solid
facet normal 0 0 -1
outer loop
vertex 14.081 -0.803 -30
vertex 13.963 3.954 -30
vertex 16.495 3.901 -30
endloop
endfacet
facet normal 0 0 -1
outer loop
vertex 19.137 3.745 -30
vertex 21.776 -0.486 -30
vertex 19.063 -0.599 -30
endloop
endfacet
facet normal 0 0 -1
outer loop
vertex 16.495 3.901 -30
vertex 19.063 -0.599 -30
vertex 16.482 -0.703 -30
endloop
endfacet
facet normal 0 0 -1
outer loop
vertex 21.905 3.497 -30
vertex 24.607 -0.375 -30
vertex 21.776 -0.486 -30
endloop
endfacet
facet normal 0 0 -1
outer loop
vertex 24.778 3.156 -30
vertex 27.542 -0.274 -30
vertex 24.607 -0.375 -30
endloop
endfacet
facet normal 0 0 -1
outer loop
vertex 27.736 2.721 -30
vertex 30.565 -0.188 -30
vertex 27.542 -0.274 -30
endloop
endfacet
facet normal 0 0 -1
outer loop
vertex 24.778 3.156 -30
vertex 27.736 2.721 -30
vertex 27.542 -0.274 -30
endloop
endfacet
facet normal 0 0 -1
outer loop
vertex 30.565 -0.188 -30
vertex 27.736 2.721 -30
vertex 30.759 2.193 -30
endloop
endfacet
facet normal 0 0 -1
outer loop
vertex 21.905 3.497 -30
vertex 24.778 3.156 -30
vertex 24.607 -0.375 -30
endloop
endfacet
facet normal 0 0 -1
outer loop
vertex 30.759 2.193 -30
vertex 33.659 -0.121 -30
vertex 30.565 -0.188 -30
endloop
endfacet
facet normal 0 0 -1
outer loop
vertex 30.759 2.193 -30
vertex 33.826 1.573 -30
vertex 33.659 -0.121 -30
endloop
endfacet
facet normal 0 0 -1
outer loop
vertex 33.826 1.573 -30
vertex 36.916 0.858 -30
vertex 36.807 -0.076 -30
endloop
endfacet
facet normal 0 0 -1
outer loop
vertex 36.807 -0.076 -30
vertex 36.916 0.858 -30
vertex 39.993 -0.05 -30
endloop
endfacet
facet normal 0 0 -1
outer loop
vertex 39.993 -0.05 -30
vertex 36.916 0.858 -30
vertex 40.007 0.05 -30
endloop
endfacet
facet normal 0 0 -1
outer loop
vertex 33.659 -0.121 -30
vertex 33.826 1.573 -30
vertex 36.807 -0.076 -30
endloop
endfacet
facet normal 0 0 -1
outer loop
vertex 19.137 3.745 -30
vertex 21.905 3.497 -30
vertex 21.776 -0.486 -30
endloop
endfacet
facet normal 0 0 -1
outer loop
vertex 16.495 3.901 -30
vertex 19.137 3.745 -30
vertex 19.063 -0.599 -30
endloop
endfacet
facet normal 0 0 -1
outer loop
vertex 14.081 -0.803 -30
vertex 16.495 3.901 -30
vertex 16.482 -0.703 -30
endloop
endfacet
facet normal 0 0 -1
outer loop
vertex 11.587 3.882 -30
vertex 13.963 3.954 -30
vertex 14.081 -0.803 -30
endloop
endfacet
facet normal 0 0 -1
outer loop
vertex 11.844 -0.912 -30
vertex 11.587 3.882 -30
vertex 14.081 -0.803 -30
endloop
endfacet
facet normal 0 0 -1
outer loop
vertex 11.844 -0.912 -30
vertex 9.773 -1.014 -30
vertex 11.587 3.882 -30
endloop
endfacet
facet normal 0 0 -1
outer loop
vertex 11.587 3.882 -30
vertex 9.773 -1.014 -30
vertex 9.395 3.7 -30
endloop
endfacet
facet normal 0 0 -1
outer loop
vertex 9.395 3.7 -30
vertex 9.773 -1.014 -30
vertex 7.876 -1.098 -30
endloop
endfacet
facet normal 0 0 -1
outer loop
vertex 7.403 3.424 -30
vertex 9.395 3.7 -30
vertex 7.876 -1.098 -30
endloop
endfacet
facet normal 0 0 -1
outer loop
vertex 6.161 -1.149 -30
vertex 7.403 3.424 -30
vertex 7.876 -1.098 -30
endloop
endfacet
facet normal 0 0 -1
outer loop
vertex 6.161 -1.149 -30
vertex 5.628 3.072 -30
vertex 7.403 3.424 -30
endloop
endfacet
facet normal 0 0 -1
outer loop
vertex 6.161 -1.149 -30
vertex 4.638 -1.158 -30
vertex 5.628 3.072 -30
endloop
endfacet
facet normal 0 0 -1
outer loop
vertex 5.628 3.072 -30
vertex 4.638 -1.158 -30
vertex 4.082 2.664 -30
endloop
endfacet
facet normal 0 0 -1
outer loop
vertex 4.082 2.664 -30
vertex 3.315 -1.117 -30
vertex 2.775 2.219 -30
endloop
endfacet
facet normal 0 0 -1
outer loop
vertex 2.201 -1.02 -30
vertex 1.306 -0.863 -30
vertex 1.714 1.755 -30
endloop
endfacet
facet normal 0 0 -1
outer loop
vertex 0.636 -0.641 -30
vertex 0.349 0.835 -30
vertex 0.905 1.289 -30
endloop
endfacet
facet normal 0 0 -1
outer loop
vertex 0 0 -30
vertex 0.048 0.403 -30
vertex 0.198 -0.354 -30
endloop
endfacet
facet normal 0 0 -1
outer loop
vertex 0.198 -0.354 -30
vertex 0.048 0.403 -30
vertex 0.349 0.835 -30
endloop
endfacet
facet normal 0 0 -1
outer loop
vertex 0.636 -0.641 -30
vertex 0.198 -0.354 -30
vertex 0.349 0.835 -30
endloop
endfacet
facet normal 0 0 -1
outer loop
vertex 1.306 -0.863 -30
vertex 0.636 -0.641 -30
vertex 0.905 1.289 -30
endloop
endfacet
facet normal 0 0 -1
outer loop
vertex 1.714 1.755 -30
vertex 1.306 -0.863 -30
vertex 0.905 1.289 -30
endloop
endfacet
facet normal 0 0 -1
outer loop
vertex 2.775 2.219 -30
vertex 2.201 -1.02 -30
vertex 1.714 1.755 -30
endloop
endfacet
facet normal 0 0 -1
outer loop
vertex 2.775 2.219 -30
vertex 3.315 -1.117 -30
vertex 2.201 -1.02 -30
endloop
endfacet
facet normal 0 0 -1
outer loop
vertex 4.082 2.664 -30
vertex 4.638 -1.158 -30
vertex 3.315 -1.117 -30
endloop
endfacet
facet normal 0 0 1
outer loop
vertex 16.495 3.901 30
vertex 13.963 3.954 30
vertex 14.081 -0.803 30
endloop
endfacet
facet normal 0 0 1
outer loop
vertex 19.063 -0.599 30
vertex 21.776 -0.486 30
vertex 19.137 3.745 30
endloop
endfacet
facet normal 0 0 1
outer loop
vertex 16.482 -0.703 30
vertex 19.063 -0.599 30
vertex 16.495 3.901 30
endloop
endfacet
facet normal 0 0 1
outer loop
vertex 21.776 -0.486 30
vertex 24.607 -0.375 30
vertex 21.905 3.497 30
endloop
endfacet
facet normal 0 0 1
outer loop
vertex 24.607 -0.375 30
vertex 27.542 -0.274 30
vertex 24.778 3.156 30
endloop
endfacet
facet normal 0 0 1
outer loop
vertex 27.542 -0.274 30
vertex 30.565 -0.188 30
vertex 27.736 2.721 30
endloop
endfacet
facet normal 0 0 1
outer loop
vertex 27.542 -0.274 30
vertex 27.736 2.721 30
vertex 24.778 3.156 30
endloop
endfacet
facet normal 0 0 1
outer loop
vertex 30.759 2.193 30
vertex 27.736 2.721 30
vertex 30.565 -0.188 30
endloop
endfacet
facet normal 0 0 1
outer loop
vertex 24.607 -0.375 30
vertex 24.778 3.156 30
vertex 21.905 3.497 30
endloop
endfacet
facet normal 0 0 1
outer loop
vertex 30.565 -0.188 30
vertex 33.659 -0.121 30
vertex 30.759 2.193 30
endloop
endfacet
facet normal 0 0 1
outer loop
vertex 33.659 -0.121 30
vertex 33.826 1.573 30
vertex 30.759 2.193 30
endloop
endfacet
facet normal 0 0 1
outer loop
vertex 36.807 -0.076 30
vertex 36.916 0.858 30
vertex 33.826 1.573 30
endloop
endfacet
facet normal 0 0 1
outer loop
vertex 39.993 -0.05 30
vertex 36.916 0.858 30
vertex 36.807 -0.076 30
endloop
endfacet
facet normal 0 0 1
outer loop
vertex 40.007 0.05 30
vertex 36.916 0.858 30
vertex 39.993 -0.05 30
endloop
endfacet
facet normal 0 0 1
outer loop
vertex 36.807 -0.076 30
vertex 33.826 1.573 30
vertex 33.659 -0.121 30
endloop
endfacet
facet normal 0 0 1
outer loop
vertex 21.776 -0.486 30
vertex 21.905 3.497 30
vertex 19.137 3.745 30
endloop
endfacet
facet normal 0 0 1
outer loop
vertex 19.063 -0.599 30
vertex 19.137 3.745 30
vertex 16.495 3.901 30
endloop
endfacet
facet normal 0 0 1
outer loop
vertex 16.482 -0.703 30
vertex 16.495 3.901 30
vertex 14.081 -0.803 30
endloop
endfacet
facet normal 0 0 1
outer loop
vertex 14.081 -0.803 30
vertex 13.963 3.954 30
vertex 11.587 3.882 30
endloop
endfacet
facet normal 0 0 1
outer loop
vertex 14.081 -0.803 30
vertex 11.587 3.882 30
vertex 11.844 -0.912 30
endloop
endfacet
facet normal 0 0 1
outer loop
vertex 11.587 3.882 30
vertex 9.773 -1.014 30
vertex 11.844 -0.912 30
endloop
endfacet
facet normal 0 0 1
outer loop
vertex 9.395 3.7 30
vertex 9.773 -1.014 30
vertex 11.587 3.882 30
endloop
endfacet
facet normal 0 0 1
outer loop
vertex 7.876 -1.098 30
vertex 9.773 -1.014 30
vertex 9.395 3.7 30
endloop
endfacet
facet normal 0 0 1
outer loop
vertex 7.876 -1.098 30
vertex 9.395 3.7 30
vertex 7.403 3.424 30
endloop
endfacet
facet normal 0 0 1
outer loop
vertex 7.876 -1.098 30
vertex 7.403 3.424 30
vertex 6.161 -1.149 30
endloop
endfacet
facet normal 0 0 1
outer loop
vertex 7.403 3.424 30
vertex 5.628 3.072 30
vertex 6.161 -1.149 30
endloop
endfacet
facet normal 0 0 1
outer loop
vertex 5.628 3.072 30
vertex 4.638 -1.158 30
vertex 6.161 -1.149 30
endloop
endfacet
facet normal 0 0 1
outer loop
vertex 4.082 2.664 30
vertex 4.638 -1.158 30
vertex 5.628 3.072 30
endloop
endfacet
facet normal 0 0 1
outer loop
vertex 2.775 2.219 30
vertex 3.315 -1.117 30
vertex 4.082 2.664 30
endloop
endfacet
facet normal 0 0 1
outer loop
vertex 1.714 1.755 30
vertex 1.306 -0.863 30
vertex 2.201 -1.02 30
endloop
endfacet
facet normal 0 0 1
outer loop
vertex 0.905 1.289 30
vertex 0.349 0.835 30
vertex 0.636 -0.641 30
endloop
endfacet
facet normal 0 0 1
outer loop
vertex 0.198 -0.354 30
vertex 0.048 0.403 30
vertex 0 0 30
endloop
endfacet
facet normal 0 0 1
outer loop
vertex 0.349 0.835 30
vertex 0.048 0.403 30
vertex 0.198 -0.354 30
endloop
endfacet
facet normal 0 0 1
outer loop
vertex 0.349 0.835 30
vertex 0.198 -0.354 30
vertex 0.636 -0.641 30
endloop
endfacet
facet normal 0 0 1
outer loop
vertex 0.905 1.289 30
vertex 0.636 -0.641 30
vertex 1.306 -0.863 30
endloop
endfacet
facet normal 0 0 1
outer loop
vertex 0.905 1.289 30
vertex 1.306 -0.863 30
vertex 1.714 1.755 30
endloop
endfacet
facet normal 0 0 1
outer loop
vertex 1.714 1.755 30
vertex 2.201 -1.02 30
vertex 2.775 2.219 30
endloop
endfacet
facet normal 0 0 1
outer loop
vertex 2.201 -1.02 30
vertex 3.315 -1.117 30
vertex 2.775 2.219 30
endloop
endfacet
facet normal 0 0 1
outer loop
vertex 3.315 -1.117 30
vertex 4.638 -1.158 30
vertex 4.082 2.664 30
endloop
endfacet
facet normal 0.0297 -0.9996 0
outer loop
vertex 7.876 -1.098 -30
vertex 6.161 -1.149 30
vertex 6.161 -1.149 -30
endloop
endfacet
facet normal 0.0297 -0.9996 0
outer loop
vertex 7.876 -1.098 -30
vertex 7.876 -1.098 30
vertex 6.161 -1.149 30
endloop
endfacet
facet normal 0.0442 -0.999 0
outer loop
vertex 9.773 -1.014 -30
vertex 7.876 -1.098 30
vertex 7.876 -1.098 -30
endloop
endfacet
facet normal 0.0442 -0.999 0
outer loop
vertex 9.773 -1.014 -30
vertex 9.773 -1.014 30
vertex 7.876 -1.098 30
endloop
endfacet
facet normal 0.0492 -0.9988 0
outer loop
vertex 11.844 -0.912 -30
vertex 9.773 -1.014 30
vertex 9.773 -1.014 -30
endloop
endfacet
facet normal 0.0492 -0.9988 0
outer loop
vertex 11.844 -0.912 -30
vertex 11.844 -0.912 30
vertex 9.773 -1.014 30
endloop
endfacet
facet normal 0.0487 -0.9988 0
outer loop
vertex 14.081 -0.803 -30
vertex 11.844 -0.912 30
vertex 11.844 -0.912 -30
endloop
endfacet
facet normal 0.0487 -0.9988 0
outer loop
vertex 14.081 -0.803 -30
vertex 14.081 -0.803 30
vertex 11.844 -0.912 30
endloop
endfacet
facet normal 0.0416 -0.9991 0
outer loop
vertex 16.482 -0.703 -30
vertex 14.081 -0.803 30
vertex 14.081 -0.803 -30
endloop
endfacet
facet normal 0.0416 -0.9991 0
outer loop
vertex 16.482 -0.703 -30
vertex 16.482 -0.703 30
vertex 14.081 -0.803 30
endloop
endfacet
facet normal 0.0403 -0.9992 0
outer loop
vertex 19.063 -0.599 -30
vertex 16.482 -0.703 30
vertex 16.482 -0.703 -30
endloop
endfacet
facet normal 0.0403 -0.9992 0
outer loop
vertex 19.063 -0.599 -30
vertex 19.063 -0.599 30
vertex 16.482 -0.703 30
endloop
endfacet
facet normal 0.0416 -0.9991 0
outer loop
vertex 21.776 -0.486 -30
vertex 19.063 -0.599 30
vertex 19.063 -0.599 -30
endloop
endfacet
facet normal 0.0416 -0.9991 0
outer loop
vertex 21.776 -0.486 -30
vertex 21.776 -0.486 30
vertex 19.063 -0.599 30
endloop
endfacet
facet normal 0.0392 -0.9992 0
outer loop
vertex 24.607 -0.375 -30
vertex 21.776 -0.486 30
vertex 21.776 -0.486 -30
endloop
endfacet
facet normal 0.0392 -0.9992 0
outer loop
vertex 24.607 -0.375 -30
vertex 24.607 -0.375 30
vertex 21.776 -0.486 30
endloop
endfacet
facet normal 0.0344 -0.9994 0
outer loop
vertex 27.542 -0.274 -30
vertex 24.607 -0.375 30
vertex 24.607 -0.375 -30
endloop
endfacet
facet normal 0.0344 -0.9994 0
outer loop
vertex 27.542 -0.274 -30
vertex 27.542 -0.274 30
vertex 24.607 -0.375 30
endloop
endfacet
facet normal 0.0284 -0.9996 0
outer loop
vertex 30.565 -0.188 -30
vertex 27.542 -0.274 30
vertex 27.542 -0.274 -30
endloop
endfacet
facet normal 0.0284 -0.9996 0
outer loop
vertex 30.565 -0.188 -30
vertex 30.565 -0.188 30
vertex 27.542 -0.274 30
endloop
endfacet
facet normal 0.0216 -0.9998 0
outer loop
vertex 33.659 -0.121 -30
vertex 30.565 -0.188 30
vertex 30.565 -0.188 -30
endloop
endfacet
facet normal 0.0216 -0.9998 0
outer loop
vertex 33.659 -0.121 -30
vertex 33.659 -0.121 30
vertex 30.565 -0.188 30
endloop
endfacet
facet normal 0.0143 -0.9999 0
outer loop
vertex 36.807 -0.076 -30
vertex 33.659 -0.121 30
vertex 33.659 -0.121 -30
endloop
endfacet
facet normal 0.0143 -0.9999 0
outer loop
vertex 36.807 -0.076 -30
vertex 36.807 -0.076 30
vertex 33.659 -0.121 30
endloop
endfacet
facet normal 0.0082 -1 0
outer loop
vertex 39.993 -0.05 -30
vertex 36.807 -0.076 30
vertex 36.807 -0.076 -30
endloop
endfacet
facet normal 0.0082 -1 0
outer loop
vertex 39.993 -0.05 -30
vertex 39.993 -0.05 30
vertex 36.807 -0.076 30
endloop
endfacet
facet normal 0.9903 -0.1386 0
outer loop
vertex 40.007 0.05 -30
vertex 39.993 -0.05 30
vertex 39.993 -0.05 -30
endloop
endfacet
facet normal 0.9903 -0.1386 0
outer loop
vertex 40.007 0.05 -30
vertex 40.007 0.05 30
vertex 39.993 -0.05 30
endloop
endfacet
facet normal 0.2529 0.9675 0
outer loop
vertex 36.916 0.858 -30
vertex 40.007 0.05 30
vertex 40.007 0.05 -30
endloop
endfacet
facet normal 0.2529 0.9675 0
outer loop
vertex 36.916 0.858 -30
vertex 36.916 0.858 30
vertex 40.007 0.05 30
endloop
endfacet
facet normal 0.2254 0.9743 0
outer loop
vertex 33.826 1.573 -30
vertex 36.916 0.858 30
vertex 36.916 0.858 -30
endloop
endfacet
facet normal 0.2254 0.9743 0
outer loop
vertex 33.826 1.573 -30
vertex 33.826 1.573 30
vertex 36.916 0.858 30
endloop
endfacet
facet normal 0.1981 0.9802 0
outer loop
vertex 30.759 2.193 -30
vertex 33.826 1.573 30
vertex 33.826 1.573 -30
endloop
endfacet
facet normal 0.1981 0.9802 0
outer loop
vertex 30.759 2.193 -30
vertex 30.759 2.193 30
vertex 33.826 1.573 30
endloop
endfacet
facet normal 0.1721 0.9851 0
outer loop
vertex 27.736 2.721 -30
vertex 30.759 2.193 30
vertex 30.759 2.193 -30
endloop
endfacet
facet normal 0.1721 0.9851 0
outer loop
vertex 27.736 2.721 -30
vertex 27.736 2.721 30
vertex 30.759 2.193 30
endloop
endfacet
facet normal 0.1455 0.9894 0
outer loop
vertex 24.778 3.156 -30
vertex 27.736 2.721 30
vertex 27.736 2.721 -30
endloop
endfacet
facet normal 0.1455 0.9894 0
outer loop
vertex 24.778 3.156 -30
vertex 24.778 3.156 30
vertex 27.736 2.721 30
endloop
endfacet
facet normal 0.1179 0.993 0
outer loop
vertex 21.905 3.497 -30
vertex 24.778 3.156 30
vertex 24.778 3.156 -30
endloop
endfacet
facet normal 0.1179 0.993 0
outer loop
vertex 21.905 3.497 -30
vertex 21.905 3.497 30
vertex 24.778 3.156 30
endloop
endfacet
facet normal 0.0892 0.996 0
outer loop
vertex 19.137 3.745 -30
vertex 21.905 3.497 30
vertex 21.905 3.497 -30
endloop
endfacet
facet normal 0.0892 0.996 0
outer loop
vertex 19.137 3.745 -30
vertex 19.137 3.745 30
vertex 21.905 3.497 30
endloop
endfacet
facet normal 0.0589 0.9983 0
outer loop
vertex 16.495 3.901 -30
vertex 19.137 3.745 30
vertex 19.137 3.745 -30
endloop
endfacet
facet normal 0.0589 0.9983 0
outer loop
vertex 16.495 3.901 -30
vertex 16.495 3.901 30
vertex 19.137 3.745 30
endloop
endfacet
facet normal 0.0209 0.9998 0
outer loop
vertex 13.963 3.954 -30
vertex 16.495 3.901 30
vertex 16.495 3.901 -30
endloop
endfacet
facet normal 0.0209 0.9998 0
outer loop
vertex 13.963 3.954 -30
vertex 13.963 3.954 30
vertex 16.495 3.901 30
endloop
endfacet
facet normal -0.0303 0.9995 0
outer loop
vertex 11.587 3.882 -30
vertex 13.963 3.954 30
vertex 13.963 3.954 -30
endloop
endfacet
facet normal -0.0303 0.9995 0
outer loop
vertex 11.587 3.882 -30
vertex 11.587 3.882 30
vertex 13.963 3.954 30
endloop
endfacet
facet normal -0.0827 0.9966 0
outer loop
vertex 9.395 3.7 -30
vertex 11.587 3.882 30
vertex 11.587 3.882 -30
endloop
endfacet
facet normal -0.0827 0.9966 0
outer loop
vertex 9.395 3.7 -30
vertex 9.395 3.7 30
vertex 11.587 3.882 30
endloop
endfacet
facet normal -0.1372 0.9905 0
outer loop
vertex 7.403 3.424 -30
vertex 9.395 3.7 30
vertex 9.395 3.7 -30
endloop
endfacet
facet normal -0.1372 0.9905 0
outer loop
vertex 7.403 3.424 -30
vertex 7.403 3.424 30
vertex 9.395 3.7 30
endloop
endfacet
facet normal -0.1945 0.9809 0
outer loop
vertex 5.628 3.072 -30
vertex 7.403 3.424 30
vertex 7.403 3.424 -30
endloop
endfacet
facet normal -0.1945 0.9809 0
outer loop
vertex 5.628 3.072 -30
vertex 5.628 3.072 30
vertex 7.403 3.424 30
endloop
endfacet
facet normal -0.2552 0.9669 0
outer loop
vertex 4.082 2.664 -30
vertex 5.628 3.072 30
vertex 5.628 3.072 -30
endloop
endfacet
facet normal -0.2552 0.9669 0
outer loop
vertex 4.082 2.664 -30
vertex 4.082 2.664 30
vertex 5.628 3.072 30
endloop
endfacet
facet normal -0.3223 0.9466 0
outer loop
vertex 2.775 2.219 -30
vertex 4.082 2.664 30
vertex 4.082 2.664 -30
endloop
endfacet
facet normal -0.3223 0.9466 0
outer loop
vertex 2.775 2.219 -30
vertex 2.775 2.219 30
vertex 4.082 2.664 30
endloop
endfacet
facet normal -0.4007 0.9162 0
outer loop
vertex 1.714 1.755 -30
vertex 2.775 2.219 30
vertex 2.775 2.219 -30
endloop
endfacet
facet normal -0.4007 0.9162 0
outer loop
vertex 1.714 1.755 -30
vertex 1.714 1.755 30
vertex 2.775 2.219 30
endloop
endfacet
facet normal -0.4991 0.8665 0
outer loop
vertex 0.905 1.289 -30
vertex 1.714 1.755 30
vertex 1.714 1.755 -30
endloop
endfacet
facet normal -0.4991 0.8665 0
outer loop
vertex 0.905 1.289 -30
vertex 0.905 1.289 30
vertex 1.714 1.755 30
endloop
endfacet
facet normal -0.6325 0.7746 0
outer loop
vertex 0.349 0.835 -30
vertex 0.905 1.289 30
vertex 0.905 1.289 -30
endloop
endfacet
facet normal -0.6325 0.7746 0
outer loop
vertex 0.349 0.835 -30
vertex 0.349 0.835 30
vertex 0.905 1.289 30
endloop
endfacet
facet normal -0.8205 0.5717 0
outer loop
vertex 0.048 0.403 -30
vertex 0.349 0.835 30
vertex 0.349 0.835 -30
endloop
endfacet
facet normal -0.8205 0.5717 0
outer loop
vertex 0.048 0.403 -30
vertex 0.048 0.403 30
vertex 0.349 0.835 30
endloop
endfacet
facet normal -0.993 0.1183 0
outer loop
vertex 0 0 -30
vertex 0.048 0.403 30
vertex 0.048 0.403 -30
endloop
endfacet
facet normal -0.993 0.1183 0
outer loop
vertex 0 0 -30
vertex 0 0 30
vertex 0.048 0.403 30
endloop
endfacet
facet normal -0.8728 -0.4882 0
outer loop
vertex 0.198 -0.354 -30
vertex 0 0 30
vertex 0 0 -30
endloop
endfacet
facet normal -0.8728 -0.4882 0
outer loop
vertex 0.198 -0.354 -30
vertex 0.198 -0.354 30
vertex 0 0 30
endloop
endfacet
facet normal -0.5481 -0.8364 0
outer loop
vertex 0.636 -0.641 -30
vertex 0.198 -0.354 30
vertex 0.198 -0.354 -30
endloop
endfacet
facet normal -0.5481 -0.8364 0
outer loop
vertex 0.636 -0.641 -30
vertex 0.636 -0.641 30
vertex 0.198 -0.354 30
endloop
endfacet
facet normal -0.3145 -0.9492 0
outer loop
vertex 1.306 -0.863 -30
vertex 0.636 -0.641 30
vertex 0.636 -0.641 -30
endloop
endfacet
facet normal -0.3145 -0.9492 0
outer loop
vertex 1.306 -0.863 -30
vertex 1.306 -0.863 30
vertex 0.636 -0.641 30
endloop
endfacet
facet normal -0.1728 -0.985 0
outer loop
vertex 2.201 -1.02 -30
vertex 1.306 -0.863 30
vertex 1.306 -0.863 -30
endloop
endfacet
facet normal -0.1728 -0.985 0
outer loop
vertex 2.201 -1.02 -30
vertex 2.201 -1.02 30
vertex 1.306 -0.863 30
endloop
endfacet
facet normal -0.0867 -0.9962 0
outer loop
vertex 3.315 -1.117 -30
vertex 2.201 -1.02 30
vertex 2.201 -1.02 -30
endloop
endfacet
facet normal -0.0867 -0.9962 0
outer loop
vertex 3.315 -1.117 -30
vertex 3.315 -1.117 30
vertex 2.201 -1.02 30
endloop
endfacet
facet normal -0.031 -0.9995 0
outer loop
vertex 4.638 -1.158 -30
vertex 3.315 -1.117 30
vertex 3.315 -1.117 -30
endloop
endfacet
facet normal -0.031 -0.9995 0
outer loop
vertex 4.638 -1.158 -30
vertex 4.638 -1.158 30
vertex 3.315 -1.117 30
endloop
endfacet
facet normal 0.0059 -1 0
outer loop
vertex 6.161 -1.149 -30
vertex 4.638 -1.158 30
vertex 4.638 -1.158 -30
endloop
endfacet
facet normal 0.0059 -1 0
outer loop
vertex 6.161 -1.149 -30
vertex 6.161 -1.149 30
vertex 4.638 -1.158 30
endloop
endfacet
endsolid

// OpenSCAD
/**
 * @file airfoil_profiles.scad
 * @brief NACA 4-digit Airfoil Profile Generator
 * @details Computes camber lines and thickness coordinates for compressor and turbine blades.
 * 
 * Copyright (c) 2026 AEGIS-TF1 Systems Development Group.
 */

// Generate x coordinates spacing from 0 to chord
function airfoil_x_coords(chord, n) = [ for (i = [0 : n]) chord * (1.0 - cos(i * 90.0 / n)) ];

// Standard NACA thickness distribution
function naca_thickness(x, chord, max_t) = 
    let (
        xc = x / chord,
        a0 = 0.2969,
        a1 = -0.1260,
        a2 = -0.3516,
        a3 = 0.2843,
        a4 = -0.1015,
        term = a0 * sqrt(xc) + a1 * xc + a2 * pow(xc, 2) + a3 * pow(xc, 3) + a4 * pow(xc, 4)
    )
    (max_t / 0.2) * chord * term;

// NACA Camber line (m = max camber, p = position of max camber, c = chord)
function naca_camber(x, chord, m, p) =
    (x < p * chord) ?
    (m * (x / pow(p, 2.0)) * (2.0 * p - (x / chord))) :
    (m * ((chord - x) / pow(1.0 - p, 2.0)) * (1.0 + (x / chord) - 2.0 * p));

// Camber line derivative/slope angle (theta)
function naca_camber_slope(x, chord, m, p) =
    let (
        dy_dx = (x < p * chord) ?
                ((2.0 * m) / pow(p, 2.0)) * (p - (x / chord)) :
                ((2.0 * m) / pow(1.0 - p, 2.0)) * (p - (x / chord))
    )
    atan(dy_dx);

// Calculate upper and lower coordinates
function naca_profile_points(chord, max_t, m, p, n=30) =
    let (
        x_vals = airfoil_x_coords(chord, n),
        upper_pts = [ for (i = [0 : n]) 
            let (
                x = x_vals[i],
                yt = naca_thickness(x, chord, max_t),
                yc = naca_camber(x, chord, m, p),
                theta = naca_camber_slope(x, chord, m, p)
            )
            [x - yt * sin(theta), yc + yt * cos(theta)]
        ],
        lower_pts = [ for (i = [n : -1 : 0]) 
            let (
                x = x_vals[i],
                yt = naca_thickness(x, chord, max_t),
                yc = naca_camber(x, chord, m, p),
                theta = naca_camber_slope(x, chord, m, p)
            )
            [x + yt * sin(theta), yc - yt * cos(theta)]
        ]
    )
    concat(upper_pts, lower_pts);

/**
 * @brief Extrudes a 2D NACA airfoil into 3D
 * @param chord Blade chord (length)
 * @param span Blade span (height)
 * @param max_t Maximum thickness ratio (e.g. 0.12)
 * @param camber Maximum camber ratio (e.g. 0.04)
 * @param camber_pos Position of maximum camber ratio (e.g. 0.40)
 */
module naca_airfoil_solid(chord, span, max_t, camber, camber_pos, n=20) {
    pts = naca_profile_points(chord, max_t, camber, camber_pos, n);
    linear_extrude(height=span, center=true)
    polygon(points=pts);
}

// Evaluates a cubic Bezier curve in 2D or 3D at parameter t (0 <= t <= 1)
function bezier_eval(p0, p1, p2, p3, t) = 
    (1.0 - t)*(1.0 - t)*(1.0 - t)*p0 + 
    3.0*(1.0 - t)*(1.0 - t)*t*p1 + 
    3.0*(1.0 - t)*t*t*p2 + 
    t*t*t*p3;

// Generates a list of n points along a cubic Bezier curve
function bezier_curve_points(p0, p1, p2, p3, n=15) = 
    [ for (i = [0 : n]) bezier_eval(p0, p1, p2, p3, i / n) ];

// Preview
color("cornflowerblue")
naca_airfoil_solid(chord=40, span=60, max_t=0.12, camber=0.04, camber_pos=0.4);
